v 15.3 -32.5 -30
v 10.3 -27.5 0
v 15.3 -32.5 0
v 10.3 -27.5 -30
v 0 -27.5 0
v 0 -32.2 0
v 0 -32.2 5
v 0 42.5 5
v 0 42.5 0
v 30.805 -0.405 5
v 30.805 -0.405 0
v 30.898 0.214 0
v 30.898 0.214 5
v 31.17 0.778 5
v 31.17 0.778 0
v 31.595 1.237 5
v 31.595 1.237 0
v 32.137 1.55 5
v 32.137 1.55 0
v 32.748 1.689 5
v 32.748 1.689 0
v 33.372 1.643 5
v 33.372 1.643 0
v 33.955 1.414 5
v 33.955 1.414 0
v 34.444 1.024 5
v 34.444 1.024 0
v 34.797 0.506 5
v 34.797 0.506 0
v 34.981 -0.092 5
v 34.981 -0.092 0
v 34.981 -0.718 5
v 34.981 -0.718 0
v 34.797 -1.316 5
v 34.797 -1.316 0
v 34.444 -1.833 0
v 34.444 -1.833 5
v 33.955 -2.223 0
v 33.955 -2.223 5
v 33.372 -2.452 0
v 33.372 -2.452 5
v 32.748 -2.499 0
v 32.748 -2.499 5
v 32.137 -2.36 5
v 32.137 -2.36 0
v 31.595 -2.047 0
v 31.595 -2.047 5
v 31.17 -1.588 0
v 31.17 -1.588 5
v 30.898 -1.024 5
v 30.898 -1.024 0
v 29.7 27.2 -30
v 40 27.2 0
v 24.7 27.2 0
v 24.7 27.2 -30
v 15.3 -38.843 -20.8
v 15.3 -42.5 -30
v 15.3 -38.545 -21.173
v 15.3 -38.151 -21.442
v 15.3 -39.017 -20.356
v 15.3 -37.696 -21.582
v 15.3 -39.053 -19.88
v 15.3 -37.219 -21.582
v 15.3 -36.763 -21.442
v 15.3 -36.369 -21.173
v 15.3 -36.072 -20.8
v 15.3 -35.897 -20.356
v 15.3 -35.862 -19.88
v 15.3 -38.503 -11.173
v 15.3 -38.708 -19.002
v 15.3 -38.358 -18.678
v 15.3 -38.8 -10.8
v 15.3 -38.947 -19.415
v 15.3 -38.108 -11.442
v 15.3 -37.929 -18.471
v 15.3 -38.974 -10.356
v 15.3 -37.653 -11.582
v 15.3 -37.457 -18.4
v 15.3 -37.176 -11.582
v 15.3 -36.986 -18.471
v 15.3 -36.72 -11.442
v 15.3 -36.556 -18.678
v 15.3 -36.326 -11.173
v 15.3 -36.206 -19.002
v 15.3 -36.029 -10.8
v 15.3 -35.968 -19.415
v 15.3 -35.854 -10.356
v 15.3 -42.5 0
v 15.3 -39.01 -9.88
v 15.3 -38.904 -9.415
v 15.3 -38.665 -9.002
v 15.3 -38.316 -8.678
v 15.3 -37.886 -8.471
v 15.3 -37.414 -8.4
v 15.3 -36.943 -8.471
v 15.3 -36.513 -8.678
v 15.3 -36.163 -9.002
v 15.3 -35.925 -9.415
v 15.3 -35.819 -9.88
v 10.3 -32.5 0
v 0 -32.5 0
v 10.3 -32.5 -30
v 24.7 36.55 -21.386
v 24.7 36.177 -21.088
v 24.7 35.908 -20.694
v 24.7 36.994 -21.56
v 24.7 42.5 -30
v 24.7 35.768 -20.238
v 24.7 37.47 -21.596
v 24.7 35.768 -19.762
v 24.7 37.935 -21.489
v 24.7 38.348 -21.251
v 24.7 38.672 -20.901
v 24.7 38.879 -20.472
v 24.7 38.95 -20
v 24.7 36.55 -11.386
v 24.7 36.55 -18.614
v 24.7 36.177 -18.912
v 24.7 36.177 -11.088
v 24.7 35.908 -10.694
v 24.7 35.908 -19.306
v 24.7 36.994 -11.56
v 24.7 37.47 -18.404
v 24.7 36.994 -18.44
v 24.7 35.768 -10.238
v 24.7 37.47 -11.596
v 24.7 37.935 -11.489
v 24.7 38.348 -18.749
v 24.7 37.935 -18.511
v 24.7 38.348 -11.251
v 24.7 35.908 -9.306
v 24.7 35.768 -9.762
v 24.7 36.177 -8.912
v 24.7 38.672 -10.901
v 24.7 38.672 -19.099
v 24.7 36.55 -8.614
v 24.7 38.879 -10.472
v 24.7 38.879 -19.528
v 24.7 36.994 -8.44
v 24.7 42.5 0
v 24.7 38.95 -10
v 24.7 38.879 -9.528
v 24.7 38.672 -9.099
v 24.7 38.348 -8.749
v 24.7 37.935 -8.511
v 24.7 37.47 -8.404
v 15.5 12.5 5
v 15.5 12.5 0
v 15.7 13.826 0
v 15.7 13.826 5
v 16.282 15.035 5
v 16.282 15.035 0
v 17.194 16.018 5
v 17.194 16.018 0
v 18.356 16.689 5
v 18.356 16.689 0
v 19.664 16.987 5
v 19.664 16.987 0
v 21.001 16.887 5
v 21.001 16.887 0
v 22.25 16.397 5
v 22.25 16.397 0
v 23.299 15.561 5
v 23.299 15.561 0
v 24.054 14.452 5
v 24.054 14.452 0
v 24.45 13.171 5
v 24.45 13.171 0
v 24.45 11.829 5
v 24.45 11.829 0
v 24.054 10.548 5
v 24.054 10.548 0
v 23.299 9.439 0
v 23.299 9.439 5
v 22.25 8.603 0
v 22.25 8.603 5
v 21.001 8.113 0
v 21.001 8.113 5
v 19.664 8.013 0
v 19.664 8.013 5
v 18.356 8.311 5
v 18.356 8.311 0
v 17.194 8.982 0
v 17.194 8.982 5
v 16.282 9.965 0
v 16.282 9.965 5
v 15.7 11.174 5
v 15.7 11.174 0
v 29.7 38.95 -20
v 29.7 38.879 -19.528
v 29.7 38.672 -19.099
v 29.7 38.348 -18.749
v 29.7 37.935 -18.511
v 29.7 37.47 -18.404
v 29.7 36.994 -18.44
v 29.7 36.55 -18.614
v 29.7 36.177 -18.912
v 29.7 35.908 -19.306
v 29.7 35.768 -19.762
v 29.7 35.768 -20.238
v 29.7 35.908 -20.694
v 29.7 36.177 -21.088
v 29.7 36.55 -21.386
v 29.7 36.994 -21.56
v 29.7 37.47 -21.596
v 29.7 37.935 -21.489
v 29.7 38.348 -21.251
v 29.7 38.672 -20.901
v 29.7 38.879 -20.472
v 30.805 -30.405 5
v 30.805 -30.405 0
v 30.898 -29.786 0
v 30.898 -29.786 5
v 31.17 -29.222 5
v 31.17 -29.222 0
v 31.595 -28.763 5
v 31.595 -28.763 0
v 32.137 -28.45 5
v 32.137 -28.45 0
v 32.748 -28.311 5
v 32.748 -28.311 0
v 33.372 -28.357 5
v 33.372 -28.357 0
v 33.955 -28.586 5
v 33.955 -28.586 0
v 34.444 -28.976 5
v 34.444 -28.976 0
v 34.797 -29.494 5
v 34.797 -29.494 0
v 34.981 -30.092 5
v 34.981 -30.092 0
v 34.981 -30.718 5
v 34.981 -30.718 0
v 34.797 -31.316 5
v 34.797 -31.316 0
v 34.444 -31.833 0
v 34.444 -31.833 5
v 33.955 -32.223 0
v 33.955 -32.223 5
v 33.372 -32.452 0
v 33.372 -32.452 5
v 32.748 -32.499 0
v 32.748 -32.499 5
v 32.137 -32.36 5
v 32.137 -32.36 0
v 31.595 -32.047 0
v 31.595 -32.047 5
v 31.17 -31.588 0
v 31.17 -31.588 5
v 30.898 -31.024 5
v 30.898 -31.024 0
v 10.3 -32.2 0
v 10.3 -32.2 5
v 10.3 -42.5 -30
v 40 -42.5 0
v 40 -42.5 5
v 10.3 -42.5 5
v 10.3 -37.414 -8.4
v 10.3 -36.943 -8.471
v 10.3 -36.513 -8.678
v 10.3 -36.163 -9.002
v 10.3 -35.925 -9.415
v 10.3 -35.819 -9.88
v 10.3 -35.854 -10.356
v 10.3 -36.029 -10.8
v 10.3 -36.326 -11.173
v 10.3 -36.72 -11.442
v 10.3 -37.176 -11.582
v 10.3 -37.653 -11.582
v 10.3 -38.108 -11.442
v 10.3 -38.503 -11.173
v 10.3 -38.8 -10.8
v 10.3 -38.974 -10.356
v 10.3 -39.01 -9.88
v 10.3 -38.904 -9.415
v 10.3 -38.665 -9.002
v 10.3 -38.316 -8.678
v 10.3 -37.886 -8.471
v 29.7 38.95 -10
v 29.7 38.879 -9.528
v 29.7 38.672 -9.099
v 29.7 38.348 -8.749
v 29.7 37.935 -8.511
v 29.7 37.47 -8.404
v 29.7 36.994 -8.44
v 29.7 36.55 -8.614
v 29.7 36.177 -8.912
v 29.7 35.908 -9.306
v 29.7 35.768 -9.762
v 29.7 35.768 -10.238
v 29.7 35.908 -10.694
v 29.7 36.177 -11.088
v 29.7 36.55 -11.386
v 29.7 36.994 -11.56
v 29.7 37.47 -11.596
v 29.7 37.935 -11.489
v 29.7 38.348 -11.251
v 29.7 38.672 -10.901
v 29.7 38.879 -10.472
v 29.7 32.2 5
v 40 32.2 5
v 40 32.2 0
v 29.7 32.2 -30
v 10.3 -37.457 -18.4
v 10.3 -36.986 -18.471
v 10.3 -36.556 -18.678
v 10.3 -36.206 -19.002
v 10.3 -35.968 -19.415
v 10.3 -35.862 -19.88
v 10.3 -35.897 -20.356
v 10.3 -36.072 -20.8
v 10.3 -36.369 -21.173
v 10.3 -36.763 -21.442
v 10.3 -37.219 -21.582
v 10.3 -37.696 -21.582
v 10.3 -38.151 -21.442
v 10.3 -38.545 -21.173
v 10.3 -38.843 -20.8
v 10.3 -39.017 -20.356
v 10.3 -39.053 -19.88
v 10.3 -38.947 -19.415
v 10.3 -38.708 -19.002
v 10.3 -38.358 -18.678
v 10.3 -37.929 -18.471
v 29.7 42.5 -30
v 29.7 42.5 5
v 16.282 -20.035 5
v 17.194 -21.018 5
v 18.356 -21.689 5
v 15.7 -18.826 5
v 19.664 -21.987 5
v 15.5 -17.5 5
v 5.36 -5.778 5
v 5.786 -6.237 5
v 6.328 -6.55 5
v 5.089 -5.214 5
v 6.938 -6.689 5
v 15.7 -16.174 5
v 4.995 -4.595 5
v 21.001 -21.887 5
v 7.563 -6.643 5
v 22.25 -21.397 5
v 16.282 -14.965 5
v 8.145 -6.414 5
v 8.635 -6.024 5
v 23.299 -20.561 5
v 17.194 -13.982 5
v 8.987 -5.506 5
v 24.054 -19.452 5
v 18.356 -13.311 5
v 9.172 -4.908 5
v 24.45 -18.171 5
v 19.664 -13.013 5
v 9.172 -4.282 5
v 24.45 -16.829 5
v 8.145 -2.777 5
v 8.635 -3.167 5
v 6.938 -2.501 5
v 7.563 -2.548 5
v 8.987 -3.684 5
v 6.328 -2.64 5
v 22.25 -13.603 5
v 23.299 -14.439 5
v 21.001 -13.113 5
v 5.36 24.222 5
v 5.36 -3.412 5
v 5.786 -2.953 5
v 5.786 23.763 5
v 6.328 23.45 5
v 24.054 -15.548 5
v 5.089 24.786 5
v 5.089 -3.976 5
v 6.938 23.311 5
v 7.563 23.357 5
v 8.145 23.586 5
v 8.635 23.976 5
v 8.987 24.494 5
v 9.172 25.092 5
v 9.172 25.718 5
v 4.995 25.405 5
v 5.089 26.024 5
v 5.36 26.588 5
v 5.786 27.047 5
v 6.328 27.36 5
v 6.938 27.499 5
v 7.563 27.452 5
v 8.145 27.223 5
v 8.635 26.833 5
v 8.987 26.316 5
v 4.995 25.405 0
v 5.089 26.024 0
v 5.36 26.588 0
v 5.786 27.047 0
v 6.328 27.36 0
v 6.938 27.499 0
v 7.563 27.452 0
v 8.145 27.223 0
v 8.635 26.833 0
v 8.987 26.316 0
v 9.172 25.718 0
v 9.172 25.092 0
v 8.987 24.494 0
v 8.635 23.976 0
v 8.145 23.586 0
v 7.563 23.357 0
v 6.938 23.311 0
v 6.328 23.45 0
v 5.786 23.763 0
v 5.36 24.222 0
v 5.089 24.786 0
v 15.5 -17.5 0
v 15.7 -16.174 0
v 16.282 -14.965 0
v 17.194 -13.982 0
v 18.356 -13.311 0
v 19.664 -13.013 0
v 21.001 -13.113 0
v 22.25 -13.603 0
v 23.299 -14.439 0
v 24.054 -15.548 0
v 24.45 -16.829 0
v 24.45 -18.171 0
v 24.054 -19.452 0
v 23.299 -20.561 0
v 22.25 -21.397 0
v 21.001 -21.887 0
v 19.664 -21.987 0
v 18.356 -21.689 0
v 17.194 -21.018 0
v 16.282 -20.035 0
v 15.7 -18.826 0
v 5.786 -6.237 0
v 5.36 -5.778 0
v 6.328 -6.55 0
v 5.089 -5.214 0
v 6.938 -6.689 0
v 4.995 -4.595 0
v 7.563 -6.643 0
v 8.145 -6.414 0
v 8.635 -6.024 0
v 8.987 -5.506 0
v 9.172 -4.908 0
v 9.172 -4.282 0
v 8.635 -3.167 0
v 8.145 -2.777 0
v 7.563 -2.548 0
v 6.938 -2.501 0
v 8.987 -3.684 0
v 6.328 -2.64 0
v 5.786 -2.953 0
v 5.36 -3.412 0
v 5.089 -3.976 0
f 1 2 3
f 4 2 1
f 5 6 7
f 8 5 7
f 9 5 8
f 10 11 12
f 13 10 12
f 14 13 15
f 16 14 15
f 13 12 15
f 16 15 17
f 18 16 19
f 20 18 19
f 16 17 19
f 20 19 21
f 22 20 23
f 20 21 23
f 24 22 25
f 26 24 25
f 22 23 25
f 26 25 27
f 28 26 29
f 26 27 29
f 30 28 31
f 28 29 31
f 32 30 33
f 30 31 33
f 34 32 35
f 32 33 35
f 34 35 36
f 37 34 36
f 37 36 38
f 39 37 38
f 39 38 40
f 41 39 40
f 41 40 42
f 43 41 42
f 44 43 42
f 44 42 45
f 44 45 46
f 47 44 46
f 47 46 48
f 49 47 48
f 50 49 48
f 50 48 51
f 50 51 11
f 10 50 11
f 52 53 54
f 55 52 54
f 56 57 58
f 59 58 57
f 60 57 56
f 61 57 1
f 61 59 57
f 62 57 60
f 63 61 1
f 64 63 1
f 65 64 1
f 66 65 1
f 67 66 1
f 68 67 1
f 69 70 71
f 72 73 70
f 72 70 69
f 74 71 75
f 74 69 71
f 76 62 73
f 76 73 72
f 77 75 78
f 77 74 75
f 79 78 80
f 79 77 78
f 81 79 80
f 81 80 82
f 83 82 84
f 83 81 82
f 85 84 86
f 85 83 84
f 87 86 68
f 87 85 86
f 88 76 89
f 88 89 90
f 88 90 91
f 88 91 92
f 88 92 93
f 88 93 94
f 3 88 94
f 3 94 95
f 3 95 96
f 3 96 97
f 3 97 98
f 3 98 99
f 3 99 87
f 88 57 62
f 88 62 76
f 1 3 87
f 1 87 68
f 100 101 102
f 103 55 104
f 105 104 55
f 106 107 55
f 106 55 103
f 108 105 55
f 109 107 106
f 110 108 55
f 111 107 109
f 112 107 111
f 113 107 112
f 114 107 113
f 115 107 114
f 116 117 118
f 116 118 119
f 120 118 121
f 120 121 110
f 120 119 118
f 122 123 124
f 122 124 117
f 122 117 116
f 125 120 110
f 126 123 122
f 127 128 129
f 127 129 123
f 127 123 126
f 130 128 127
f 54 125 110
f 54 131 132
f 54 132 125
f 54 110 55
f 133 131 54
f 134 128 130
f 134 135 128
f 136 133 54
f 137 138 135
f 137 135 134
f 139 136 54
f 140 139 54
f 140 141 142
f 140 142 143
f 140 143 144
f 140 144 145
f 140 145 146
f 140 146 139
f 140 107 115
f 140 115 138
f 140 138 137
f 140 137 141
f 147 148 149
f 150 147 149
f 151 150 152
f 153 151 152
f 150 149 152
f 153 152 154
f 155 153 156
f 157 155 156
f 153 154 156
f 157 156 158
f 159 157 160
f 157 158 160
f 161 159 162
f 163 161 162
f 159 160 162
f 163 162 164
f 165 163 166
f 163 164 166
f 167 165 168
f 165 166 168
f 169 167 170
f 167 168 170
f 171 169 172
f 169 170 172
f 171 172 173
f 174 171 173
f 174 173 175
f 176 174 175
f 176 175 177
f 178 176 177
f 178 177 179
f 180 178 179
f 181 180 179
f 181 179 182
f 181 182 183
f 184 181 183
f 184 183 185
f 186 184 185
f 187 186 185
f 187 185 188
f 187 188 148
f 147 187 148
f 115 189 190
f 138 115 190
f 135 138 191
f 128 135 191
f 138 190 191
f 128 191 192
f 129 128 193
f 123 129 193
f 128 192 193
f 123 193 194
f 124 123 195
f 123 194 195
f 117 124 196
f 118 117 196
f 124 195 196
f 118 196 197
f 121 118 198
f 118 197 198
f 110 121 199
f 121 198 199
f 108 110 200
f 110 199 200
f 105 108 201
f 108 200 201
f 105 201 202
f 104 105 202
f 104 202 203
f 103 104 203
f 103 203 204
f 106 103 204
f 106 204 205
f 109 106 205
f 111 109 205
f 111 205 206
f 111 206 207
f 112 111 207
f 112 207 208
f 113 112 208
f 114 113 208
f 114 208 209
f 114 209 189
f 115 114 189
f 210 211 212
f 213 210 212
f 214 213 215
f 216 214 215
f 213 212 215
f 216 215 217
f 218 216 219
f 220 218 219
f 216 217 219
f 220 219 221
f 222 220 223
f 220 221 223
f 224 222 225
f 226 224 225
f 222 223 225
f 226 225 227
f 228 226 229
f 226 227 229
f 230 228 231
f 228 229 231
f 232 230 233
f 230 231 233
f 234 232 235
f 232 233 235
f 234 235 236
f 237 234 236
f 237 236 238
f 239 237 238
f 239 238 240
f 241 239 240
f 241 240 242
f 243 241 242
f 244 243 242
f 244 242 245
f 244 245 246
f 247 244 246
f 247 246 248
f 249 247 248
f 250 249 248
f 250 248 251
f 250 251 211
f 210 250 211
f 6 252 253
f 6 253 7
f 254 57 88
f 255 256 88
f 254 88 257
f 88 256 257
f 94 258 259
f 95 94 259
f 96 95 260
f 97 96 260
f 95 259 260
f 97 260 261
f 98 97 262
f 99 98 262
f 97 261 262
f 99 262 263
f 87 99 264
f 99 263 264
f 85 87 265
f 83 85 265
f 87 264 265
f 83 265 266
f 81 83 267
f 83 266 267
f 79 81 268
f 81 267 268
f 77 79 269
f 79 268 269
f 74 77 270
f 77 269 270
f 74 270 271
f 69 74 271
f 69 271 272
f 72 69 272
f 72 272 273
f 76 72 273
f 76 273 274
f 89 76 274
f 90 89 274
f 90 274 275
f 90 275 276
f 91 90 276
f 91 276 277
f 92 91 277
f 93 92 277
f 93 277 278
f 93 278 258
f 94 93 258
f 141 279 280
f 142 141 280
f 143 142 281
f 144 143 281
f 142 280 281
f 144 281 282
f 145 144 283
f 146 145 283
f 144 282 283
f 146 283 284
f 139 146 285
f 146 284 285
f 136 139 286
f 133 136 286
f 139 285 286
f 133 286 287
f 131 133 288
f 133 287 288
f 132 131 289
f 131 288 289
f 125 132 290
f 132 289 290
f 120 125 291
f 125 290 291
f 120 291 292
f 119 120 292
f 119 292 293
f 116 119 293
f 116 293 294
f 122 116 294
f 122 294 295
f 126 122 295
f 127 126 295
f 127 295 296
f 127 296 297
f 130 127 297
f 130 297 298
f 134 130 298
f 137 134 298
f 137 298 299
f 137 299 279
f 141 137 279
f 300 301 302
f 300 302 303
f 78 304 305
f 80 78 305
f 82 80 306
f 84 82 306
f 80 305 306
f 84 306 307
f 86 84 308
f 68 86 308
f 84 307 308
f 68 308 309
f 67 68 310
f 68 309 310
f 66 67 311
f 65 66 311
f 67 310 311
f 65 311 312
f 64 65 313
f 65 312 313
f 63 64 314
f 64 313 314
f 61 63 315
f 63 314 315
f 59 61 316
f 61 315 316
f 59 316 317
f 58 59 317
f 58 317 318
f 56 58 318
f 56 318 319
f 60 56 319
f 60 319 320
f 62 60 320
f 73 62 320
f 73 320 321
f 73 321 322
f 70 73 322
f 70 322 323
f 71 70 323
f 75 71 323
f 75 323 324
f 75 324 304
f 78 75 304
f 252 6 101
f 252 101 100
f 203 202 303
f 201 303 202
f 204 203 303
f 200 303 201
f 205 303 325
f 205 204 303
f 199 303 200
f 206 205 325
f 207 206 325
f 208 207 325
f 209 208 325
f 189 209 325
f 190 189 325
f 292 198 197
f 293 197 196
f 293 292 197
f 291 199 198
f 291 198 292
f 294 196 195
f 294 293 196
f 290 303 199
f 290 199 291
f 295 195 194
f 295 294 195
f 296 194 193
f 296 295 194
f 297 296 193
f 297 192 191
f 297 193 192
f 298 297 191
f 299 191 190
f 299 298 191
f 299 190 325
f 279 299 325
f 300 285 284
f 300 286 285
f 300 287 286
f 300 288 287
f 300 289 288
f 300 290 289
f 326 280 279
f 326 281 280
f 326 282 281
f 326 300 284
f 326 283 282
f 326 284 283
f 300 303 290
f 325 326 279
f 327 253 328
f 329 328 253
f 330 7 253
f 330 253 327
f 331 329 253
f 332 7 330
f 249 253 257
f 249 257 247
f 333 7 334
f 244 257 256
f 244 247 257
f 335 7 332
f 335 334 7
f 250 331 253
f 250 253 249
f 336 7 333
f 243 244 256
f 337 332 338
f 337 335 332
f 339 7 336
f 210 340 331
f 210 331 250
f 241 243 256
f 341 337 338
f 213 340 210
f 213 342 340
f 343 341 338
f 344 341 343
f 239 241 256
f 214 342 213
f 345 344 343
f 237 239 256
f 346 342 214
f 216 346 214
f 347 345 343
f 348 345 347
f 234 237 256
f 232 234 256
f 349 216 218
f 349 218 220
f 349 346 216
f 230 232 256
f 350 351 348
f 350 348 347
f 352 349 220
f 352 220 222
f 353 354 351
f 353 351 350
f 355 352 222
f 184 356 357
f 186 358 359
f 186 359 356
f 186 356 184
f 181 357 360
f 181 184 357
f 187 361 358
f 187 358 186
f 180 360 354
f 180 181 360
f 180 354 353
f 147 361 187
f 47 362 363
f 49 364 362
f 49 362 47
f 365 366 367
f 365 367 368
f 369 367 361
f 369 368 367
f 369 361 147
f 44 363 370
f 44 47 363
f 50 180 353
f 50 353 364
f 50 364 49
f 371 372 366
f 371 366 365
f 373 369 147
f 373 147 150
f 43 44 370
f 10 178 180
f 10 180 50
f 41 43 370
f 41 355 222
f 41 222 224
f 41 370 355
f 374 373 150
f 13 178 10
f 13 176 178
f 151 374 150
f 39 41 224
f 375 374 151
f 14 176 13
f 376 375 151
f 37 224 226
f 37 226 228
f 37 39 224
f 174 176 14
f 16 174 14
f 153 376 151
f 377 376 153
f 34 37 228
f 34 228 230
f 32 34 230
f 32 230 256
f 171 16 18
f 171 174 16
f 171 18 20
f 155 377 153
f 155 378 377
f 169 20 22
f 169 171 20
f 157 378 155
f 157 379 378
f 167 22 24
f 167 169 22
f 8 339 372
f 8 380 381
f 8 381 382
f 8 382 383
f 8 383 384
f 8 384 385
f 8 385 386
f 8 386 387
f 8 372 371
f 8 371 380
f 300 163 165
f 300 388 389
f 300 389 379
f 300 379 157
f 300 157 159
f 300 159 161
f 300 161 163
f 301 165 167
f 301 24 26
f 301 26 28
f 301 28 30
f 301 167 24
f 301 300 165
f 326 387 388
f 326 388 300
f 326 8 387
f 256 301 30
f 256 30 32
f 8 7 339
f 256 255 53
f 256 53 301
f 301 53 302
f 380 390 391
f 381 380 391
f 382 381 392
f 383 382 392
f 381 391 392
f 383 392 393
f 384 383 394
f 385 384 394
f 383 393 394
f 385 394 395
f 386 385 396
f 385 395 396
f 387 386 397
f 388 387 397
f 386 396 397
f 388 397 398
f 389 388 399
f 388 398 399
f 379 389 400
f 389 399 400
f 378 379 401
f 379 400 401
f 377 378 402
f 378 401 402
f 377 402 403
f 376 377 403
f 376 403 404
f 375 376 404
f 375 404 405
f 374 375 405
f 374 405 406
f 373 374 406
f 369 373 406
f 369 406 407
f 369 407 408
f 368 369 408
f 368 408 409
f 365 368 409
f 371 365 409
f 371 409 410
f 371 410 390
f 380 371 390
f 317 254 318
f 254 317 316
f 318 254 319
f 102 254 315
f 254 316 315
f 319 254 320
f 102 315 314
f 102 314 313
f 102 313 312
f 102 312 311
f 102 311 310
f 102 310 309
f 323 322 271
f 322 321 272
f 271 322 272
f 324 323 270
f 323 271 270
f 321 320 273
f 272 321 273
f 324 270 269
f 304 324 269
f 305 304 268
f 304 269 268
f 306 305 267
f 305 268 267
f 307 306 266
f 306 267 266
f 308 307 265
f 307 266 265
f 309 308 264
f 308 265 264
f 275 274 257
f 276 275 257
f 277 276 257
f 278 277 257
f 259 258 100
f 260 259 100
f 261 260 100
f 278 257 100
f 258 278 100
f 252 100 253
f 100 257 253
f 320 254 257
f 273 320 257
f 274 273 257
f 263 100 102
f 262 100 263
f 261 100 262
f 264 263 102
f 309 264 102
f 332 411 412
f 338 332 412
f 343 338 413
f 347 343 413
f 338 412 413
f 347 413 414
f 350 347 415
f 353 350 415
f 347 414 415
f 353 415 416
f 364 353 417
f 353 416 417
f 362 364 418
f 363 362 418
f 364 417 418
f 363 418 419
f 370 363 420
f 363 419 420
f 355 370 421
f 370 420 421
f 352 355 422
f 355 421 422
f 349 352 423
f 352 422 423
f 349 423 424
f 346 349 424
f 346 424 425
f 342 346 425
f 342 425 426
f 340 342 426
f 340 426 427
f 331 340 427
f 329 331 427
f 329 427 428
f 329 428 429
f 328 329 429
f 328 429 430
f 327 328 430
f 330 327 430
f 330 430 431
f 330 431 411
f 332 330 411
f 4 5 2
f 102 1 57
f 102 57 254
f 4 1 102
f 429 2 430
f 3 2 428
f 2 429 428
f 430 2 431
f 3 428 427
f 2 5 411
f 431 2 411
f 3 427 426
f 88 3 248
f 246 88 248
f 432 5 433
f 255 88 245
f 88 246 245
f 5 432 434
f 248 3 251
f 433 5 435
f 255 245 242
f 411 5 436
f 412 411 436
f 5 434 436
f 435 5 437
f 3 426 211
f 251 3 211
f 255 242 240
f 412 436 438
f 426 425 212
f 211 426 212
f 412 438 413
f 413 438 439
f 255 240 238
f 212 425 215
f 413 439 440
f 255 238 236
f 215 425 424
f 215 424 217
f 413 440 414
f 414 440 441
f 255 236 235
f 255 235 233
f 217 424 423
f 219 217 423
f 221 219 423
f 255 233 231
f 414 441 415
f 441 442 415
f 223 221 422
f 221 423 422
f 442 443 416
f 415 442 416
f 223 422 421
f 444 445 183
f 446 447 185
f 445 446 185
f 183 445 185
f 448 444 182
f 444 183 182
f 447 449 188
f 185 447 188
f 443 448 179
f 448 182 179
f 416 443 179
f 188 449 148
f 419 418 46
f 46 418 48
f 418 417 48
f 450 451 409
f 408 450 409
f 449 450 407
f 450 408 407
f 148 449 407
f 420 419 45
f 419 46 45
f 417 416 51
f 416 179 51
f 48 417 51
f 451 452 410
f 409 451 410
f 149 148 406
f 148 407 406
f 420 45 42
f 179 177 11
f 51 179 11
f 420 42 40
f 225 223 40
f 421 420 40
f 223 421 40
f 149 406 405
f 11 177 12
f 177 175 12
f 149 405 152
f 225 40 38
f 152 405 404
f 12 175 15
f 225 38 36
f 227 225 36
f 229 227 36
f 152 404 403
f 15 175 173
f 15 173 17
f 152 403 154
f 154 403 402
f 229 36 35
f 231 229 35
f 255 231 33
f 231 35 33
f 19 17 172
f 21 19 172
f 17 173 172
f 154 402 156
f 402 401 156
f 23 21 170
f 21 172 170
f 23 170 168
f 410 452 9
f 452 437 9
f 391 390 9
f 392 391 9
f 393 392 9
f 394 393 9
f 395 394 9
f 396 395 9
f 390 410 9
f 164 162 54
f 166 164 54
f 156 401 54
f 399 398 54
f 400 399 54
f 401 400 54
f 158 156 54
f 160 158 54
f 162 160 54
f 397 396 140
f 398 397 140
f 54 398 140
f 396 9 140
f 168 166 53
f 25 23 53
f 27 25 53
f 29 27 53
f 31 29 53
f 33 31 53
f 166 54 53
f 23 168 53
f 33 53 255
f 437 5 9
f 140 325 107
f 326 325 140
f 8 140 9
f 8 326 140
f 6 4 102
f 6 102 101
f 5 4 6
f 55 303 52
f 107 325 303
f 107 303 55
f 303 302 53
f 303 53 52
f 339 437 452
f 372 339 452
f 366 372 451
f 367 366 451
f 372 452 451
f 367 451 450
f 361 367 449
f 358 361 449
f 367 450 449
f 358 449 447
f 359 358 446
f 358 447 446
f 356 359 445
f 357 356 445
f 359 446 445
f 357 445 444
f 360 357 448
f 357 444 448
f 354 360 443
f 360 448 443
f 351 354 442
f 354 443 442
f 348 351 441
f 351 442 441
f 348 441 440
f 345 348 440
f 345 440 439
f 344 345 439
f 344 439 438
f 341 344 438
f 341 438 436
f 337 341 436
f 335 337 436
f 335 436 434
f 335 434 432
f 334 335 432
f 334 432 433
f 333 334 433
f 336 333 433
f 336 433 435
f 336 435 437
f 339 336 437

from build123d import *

# Parameters (mm, degrees)
SKETCH1_W           = 80
SKETCH1_H           = 85
BOSS_EXTRUDE1_DEPTH = 5
CUT_EXTRUDE1_REACH  = 60.577
SKETCH2_R           = 4.5
SKETCH2_R_2         = 2.1
CUT_EXTRUDE2_REACH  = 60.577
SKETCH3_W           = 10.3
SKETCH3_H           = 10.3
SKETCH3_W_2         = 10
SKETCH3_H_2         = 10
SKETCH4_W           = 40
SKETCH4_H           = 85
CUT_EXTRUDE4_DEPTH  = 10
SKETCH5_W           = 5
SKETCH5_H           = 10.3
BOSS_EXTRUDE2_DEPTH = 30
BOSS_EXTRUDE3_DEPTH = 5
CUT_EXTRUDE5_REACH  = 67.622
SKETCH7_W           = 10.3
SKETCH7_H           = 10.3
SKETCH8_W           = 5
SKETCH8_H           = 15
BOSS_EXTRUDE4_DEPTH = 30
BOSS_EXTRUDE5_DEPTH = 5
CHAMFER1_SIZE       = 5
CUT_EXTRUDE6_REACH  = 61.903
SKETCH10_R          = 1.6
CUT_EXTRUDE7_REACH  = 61.903
SKETCH12_R          = 1.6


with BuildPart() as part:
    # Sketch1 → Boss-Extrude1 (new body)
    with BuildSketch(Plane.XY):
        Rectangle(SKETCH1_W, SKETCH1_H)
    extrude(amount=BOSS_EXTRUDE1_DEPTH)

    # Sketch2 → Cut-Extrude1 (cut, up to next)
    with BuildSketch(Plane(origin=(0, 0, 0), x_dir=(-1, 0, 0), z_dir=(0, 0, -1)), mode=Mode.PRIVATE) as cut_extrude1_sk1:
        with Locations((-20, 12.5)):
            Circle(SKETCH2_R)
    cut_extrude1_tool1 = extrude(cut_extrude1_sk1.sketch, amount=-CUT_EXTRUDE1_REACH, mode=Mode.PRIVATE) & part.part
    # Sketch2 → Cut-Extrude1 (cut, up to next)
    with BuildSketch(Plane(origin=(0, 0, 0), x_dir=(-1, 0, 0), z_dir=(0, 0, -1)), mode=Mode.PRIVATE) as cut_extrude1_sk2:
        with Locations((-7.095301243, 25.404698757)):
            Circle(SKETCH2_R_2)
    cut_extrude1_tool2 = extrude(cut_extrude1_sk2.sketch, amount=-CUT_EXTRUDE1_REACH, mode=Mode.PRIVATE) & part.part
    # Sketch2 → Cut-Extrude1 (cut, up to next)
    with BuildSketch(Plane(origin=(0, 0, 0), x_dir=(-1, 0, 0), z_dir=(0, 0, -1)), mode=Mode.PRIVATE) as cut_extrude1_sk3:
        with Locations((-32.904698757, -0.404698757)):
            Circle(SKETCH2_R_2)
    cut_extrude1_tool3 = extrude(cut_extrude1_sk3.sketch, amount=-CUT_EXTRUDE1_REACH, mode=Mode.PRIVATE) & part.part
    # Sketch2 → Cut-Extrude1 (cut, up to next)
    with BuildSketch(Plane(origin=(0, 0, 0), x_dir=(-1, 0, 0), z_dir=(0, 0, -1)), mode=Mode.PRIVATE) as cut_extrude1_sk4:
        with Locations((-20, -17.5)):
            Circle(SKETCH2_R)
    cut_extrude1_tool4 = extrude(cut_extrude1_sk4.sketch, amount=-CUT_EXTRUDE1_REACH, mode=Mode.PRIVATE) & part.part
    # Sketch2 → Cut-Extrude1 (cut, up to next)
    with BuildSketch(Plane(origin=(0, 0, 0), x_dir=(-1, 0, 0), z_dir=(0, 0, -1)), mode=Mode.PRIVATE) as cut_extrude1_sk5:
        with Locations((-7.095301243, -4.595301243)):
            Circle(SKETCH2_R_2)
    cut_extrude1_tool5 = extrude(cut_extrude1_sk5.sketch, amount=-CUT_EXTRUDE1_REACH, mode=Mode.PRIVATE) & part.part
    # Sketch2 → Cut-Extrude1 (cut, up to next)
    with BuildSketch(Plane(origin=(0, 0, 0), x_dir=(-1, 0, 0), z_dir=(0, 0, -1)), mode=Mode.PRIVATE) as cut_extrude1_sk6:
        with Locations((-32.904698757, -30.404698757)):
            Circle(SKETCH2_R_2)
    cut_extrude1_tool6 = extrude(cut_extrude1_sk6.sketch, amount=-CUT_EXTRUDE1_REACH, mode=Mode.PRIVATE) & part.part
    add(cut_extrude1_tool1.solids().sort_by_distance((20, 12.5, 0))[0], mode=Mode.SUBTRACT)
    add(cut_extrude1_tool2.solids().sort_by_distance((7.095301, 25.404699, 0))[0], mode=Mode.SUBTRACT)
    add(cut_extrude1_tool3.solids().sort_by_distance((32.904699, -0.404699, 0))[0], mode=Mode.SUBTRACT)
    add(cut_extrude1_tool4.solids().sort_by_distance((20, -17.5, 0))[0], mode=Mode.SUBTRACT)
    add(cut_extrude1_tool5.solids().sort_by_distance((7.095301, -4.595301, 0))[0], mode=Mode.SUBTRACT)
    add(cut_extrude1_tool6.solids().sort_by_distance((32.904699, -30.404699, 0))[0], mode=Mode.SUBTRACT)

    # Sketch3 → Cut-Extrude2 (cut, up to next)
    with BuildSketch(Plane(origin=(0, 0, 0), x_dir=(-1, 0, 0), z_dir=(0, 0, -1)), mode=Mode.PRIVATE) as cut_extrude2_sk1:
        with Locations((-34.85, 37.35)):
            Rectangle(SKETCH3_W, SKETCH3_H)
    cut_extrude2_tool1 = extrude(cut_extrude2_sk1.sketch, amount=-CUT_EXTRUDE2_REACH, mode=Mode.PRIVATE) & part.part
    # Sketch3 → Cut-Extrude2 (cut, up to next)
    with BuildSketch(Plane(origin=(0, 0, 0), x_dir=(-1, 0, 0), z_dir=(0, 0, -1)), mode=Mode.PRIVATE) as cut_extrude2_sk2:
        with Locations((35, 37.5)):
            Rectangle(SKETCH3_W_2, SKETCH3_H_2)
    cut_extrude2_tool2 = extrude(cut_extrude2_sk2.sketch, amount=-CUT_EXTRUDE2_REACH, mode=Mode.PRIVATE) & part.part
    add(cut_extrude2_tool1.solids().sort_by_distance((34.85, 37.35, 0))[0], mode=Mode.SUBTRACT)
    add(cut_extrude2_tool2.solids().sort_by_distance((-35, 37.5, 0))[0], mode=Mode.SUBTRACT)

    # Sketch4 → Cut-Extrude4 (cut)
    with BuildSketch(Plane(origin=(0, 0, 0), x_dir=(-1, 0, 0), z_dir=(0, 0, -1))):
        with Locations((20, 0)):
            Rectangle(SKETCH4_W, SKETCH4_H)
    extrude(amount=-CUT_EXTRUDE4_DEPTH, mode=Mode.SUBTRACT)

    # Sketch5 → Boss-Extrude2 (add)
    with BuildSketch(Plane(origin=(0, 0, 0), x_dir=(-1, 0, 0), z_dir=(0, 0, -1))):
        with Locations((-27.2, 37.35)):
            Rectangle(SKETCH5_W, SKETCH5_H)
    extrude(amount=BOSS_EXTRUDE2_DEPTH)

    # Sketch6 → Boss-Extrude3 (add)
    with BuildSketch(Plane.XZ.offset(-32.2)):
        Polygon((40, 0), (29.7, -30), (24.7, -30), (24.7, 5), (40, 5), align=None)
    extrude(amount=BOSS_EXTRUDE3_DEPTH)

    # Sketch7 → Cut-Extrude5 (cut, up to next)
    with BuildSketch(Plane(origin=(0, 0, 0), x_dir=(-1, 0, 0), z_dir=(0, 0, -1)), mode=Mode.PRIVATE) as cut_extrude5_sk1:
        with Locations((-5.15, -37.35)):
            Rectangle(SKETCH7_W, SKETCH7_H)
    cut_extrude5_tool1 = extrude(cut_extrude5_sk1.sketch, amount=-CUT_EXTRUDE5_REACH, mode=Mode.PRIVATE) & part.part
    add(cut_extrude5_tool1.solids().sort_by_distance((5.15, -37.35, 0))[0], mode=Mode.SUBTRACT)

    # Sketch8 → Boss-Extrude4 (add)
    with BuildSketch(Plane(origin=(0, 0, 0), x_dir=(-1, 0, 0), z_dir=(0, 0, -1))):
        with Locations((-12.8, -35)):
            Rectangle(SKETCH8_W, SKETCH8_H)
    extrude(amount=BOSS_EXTRUDE4_DEPTH)

    # Sketch9 → Boss-Extrude5 (add)
    with BuildSketch(Plane(origin=(0, -27.5, 0), x_dir=(1, 0, 0), z_dir=(0, 1, 0))):
        Polygon((10.3, 30), (0, 0), (10.3, 0), align=None)
    extrude(amount=-BOSS_EXTRUDE5_DEPTH)

    # Chamfer1
    chamfer1_edges = [part.edges().sort_by_distance(p)[0] for p in [
        (15.3, -27.5, -15),
    ]]
    chamfer(chamfer1_edges, length=CHAMFER1_SIZE)

    # Sketch10 → Cut-Extrude6 (cut, up to next)
    with BuildSketch(Plane.ZY.offset(-10.3), mode=Mode.PRIVATE) as cut_extrude6_sk1:
        with Locations((-20, -37.457142857)):
            Circle(SKETCH10_R)
    cut_extrude6_tool1 = extrude(cut_extrude6_sk1.sketch, amount=-CUT_EXTRUDE6_REACH, mode=Mode.PRIVATE) & part.part
    # Sketch10 → Cut-Extrude6 (cut, up to next)
    with BuildSketch(Plane.ZY.offset(-10.3), mode=Mode.PRIVATE) as cut_extrude6_sk2:
        with Locations((-10, -37.414285714)):
            Circle(SKETCH10_R)
    cut_extrude6_tool2 = extrude(cut_extrude6_sk2.sketch, amount=-CUT_EXTRUDE6_REACH, mode=Mode.PRIVATE) & part.part
    add(cut_extrude6_tool1.solids().sort_by_distance((10.3, -37.457143, -20))[0], mode=Mode.SUBTRACT)
    add(cut_extrude6_tool2.solids().sort_by_distance((10.3, -37.414286, -10))[0], mode=Mode.SUBTRACT)

    # Sketch12 → Cut-Extrude7 (cut, up to next)
    with BuildSketch(Plane(origin=(29.7, 0, 0), x_dir=(0, 0, -1), z_dir=(1, 0, 0)), mode=Mode.PRIVATE) as cut_extrude7_sk1:
        with Locations(Location((20, 37.35, 0), (0, 0, 90))):
            Circle(SKETCH12_R)
    cut_extrude7_tool1 = extrude(cut_extrude7_sk1.sketch, amount=-CUT_EXTRUDE7_REACH, mode=Mode.PRIVATE) & part.part
    # Sketch12 → Cut-Extrude7 (cut, up to next)
    with BuildSketch(Plane(origin=(29.7, 0, 0), x_dir=(0, 0, -1), z_dir=(1, 0, 0)), mode=Mode.PRIVATE) as cut_extrude7_sk2:
        with Locations(Location((10, 37.35, 0), (0, 0, 90))):
            Circle(SKETCH12_R)
    cut_extrude7_tool2 = extrude(cut_extrude7_sk2.sketch, amount=-CUT_EXTRUDE7_REACH, mode=Mode.PRIVATE) & part.part
    add(cut_extrude7_tool1.solids().sort_by_distance((29.7, 37.35, -20))[0], mode=Mode.SUBTRACT)
    add(cut_extrude7_tool2.solids().sort_by_distance((29.7, 37.35, -10))[0], mode=Mode.SUBTRACT)


solid = part.part
